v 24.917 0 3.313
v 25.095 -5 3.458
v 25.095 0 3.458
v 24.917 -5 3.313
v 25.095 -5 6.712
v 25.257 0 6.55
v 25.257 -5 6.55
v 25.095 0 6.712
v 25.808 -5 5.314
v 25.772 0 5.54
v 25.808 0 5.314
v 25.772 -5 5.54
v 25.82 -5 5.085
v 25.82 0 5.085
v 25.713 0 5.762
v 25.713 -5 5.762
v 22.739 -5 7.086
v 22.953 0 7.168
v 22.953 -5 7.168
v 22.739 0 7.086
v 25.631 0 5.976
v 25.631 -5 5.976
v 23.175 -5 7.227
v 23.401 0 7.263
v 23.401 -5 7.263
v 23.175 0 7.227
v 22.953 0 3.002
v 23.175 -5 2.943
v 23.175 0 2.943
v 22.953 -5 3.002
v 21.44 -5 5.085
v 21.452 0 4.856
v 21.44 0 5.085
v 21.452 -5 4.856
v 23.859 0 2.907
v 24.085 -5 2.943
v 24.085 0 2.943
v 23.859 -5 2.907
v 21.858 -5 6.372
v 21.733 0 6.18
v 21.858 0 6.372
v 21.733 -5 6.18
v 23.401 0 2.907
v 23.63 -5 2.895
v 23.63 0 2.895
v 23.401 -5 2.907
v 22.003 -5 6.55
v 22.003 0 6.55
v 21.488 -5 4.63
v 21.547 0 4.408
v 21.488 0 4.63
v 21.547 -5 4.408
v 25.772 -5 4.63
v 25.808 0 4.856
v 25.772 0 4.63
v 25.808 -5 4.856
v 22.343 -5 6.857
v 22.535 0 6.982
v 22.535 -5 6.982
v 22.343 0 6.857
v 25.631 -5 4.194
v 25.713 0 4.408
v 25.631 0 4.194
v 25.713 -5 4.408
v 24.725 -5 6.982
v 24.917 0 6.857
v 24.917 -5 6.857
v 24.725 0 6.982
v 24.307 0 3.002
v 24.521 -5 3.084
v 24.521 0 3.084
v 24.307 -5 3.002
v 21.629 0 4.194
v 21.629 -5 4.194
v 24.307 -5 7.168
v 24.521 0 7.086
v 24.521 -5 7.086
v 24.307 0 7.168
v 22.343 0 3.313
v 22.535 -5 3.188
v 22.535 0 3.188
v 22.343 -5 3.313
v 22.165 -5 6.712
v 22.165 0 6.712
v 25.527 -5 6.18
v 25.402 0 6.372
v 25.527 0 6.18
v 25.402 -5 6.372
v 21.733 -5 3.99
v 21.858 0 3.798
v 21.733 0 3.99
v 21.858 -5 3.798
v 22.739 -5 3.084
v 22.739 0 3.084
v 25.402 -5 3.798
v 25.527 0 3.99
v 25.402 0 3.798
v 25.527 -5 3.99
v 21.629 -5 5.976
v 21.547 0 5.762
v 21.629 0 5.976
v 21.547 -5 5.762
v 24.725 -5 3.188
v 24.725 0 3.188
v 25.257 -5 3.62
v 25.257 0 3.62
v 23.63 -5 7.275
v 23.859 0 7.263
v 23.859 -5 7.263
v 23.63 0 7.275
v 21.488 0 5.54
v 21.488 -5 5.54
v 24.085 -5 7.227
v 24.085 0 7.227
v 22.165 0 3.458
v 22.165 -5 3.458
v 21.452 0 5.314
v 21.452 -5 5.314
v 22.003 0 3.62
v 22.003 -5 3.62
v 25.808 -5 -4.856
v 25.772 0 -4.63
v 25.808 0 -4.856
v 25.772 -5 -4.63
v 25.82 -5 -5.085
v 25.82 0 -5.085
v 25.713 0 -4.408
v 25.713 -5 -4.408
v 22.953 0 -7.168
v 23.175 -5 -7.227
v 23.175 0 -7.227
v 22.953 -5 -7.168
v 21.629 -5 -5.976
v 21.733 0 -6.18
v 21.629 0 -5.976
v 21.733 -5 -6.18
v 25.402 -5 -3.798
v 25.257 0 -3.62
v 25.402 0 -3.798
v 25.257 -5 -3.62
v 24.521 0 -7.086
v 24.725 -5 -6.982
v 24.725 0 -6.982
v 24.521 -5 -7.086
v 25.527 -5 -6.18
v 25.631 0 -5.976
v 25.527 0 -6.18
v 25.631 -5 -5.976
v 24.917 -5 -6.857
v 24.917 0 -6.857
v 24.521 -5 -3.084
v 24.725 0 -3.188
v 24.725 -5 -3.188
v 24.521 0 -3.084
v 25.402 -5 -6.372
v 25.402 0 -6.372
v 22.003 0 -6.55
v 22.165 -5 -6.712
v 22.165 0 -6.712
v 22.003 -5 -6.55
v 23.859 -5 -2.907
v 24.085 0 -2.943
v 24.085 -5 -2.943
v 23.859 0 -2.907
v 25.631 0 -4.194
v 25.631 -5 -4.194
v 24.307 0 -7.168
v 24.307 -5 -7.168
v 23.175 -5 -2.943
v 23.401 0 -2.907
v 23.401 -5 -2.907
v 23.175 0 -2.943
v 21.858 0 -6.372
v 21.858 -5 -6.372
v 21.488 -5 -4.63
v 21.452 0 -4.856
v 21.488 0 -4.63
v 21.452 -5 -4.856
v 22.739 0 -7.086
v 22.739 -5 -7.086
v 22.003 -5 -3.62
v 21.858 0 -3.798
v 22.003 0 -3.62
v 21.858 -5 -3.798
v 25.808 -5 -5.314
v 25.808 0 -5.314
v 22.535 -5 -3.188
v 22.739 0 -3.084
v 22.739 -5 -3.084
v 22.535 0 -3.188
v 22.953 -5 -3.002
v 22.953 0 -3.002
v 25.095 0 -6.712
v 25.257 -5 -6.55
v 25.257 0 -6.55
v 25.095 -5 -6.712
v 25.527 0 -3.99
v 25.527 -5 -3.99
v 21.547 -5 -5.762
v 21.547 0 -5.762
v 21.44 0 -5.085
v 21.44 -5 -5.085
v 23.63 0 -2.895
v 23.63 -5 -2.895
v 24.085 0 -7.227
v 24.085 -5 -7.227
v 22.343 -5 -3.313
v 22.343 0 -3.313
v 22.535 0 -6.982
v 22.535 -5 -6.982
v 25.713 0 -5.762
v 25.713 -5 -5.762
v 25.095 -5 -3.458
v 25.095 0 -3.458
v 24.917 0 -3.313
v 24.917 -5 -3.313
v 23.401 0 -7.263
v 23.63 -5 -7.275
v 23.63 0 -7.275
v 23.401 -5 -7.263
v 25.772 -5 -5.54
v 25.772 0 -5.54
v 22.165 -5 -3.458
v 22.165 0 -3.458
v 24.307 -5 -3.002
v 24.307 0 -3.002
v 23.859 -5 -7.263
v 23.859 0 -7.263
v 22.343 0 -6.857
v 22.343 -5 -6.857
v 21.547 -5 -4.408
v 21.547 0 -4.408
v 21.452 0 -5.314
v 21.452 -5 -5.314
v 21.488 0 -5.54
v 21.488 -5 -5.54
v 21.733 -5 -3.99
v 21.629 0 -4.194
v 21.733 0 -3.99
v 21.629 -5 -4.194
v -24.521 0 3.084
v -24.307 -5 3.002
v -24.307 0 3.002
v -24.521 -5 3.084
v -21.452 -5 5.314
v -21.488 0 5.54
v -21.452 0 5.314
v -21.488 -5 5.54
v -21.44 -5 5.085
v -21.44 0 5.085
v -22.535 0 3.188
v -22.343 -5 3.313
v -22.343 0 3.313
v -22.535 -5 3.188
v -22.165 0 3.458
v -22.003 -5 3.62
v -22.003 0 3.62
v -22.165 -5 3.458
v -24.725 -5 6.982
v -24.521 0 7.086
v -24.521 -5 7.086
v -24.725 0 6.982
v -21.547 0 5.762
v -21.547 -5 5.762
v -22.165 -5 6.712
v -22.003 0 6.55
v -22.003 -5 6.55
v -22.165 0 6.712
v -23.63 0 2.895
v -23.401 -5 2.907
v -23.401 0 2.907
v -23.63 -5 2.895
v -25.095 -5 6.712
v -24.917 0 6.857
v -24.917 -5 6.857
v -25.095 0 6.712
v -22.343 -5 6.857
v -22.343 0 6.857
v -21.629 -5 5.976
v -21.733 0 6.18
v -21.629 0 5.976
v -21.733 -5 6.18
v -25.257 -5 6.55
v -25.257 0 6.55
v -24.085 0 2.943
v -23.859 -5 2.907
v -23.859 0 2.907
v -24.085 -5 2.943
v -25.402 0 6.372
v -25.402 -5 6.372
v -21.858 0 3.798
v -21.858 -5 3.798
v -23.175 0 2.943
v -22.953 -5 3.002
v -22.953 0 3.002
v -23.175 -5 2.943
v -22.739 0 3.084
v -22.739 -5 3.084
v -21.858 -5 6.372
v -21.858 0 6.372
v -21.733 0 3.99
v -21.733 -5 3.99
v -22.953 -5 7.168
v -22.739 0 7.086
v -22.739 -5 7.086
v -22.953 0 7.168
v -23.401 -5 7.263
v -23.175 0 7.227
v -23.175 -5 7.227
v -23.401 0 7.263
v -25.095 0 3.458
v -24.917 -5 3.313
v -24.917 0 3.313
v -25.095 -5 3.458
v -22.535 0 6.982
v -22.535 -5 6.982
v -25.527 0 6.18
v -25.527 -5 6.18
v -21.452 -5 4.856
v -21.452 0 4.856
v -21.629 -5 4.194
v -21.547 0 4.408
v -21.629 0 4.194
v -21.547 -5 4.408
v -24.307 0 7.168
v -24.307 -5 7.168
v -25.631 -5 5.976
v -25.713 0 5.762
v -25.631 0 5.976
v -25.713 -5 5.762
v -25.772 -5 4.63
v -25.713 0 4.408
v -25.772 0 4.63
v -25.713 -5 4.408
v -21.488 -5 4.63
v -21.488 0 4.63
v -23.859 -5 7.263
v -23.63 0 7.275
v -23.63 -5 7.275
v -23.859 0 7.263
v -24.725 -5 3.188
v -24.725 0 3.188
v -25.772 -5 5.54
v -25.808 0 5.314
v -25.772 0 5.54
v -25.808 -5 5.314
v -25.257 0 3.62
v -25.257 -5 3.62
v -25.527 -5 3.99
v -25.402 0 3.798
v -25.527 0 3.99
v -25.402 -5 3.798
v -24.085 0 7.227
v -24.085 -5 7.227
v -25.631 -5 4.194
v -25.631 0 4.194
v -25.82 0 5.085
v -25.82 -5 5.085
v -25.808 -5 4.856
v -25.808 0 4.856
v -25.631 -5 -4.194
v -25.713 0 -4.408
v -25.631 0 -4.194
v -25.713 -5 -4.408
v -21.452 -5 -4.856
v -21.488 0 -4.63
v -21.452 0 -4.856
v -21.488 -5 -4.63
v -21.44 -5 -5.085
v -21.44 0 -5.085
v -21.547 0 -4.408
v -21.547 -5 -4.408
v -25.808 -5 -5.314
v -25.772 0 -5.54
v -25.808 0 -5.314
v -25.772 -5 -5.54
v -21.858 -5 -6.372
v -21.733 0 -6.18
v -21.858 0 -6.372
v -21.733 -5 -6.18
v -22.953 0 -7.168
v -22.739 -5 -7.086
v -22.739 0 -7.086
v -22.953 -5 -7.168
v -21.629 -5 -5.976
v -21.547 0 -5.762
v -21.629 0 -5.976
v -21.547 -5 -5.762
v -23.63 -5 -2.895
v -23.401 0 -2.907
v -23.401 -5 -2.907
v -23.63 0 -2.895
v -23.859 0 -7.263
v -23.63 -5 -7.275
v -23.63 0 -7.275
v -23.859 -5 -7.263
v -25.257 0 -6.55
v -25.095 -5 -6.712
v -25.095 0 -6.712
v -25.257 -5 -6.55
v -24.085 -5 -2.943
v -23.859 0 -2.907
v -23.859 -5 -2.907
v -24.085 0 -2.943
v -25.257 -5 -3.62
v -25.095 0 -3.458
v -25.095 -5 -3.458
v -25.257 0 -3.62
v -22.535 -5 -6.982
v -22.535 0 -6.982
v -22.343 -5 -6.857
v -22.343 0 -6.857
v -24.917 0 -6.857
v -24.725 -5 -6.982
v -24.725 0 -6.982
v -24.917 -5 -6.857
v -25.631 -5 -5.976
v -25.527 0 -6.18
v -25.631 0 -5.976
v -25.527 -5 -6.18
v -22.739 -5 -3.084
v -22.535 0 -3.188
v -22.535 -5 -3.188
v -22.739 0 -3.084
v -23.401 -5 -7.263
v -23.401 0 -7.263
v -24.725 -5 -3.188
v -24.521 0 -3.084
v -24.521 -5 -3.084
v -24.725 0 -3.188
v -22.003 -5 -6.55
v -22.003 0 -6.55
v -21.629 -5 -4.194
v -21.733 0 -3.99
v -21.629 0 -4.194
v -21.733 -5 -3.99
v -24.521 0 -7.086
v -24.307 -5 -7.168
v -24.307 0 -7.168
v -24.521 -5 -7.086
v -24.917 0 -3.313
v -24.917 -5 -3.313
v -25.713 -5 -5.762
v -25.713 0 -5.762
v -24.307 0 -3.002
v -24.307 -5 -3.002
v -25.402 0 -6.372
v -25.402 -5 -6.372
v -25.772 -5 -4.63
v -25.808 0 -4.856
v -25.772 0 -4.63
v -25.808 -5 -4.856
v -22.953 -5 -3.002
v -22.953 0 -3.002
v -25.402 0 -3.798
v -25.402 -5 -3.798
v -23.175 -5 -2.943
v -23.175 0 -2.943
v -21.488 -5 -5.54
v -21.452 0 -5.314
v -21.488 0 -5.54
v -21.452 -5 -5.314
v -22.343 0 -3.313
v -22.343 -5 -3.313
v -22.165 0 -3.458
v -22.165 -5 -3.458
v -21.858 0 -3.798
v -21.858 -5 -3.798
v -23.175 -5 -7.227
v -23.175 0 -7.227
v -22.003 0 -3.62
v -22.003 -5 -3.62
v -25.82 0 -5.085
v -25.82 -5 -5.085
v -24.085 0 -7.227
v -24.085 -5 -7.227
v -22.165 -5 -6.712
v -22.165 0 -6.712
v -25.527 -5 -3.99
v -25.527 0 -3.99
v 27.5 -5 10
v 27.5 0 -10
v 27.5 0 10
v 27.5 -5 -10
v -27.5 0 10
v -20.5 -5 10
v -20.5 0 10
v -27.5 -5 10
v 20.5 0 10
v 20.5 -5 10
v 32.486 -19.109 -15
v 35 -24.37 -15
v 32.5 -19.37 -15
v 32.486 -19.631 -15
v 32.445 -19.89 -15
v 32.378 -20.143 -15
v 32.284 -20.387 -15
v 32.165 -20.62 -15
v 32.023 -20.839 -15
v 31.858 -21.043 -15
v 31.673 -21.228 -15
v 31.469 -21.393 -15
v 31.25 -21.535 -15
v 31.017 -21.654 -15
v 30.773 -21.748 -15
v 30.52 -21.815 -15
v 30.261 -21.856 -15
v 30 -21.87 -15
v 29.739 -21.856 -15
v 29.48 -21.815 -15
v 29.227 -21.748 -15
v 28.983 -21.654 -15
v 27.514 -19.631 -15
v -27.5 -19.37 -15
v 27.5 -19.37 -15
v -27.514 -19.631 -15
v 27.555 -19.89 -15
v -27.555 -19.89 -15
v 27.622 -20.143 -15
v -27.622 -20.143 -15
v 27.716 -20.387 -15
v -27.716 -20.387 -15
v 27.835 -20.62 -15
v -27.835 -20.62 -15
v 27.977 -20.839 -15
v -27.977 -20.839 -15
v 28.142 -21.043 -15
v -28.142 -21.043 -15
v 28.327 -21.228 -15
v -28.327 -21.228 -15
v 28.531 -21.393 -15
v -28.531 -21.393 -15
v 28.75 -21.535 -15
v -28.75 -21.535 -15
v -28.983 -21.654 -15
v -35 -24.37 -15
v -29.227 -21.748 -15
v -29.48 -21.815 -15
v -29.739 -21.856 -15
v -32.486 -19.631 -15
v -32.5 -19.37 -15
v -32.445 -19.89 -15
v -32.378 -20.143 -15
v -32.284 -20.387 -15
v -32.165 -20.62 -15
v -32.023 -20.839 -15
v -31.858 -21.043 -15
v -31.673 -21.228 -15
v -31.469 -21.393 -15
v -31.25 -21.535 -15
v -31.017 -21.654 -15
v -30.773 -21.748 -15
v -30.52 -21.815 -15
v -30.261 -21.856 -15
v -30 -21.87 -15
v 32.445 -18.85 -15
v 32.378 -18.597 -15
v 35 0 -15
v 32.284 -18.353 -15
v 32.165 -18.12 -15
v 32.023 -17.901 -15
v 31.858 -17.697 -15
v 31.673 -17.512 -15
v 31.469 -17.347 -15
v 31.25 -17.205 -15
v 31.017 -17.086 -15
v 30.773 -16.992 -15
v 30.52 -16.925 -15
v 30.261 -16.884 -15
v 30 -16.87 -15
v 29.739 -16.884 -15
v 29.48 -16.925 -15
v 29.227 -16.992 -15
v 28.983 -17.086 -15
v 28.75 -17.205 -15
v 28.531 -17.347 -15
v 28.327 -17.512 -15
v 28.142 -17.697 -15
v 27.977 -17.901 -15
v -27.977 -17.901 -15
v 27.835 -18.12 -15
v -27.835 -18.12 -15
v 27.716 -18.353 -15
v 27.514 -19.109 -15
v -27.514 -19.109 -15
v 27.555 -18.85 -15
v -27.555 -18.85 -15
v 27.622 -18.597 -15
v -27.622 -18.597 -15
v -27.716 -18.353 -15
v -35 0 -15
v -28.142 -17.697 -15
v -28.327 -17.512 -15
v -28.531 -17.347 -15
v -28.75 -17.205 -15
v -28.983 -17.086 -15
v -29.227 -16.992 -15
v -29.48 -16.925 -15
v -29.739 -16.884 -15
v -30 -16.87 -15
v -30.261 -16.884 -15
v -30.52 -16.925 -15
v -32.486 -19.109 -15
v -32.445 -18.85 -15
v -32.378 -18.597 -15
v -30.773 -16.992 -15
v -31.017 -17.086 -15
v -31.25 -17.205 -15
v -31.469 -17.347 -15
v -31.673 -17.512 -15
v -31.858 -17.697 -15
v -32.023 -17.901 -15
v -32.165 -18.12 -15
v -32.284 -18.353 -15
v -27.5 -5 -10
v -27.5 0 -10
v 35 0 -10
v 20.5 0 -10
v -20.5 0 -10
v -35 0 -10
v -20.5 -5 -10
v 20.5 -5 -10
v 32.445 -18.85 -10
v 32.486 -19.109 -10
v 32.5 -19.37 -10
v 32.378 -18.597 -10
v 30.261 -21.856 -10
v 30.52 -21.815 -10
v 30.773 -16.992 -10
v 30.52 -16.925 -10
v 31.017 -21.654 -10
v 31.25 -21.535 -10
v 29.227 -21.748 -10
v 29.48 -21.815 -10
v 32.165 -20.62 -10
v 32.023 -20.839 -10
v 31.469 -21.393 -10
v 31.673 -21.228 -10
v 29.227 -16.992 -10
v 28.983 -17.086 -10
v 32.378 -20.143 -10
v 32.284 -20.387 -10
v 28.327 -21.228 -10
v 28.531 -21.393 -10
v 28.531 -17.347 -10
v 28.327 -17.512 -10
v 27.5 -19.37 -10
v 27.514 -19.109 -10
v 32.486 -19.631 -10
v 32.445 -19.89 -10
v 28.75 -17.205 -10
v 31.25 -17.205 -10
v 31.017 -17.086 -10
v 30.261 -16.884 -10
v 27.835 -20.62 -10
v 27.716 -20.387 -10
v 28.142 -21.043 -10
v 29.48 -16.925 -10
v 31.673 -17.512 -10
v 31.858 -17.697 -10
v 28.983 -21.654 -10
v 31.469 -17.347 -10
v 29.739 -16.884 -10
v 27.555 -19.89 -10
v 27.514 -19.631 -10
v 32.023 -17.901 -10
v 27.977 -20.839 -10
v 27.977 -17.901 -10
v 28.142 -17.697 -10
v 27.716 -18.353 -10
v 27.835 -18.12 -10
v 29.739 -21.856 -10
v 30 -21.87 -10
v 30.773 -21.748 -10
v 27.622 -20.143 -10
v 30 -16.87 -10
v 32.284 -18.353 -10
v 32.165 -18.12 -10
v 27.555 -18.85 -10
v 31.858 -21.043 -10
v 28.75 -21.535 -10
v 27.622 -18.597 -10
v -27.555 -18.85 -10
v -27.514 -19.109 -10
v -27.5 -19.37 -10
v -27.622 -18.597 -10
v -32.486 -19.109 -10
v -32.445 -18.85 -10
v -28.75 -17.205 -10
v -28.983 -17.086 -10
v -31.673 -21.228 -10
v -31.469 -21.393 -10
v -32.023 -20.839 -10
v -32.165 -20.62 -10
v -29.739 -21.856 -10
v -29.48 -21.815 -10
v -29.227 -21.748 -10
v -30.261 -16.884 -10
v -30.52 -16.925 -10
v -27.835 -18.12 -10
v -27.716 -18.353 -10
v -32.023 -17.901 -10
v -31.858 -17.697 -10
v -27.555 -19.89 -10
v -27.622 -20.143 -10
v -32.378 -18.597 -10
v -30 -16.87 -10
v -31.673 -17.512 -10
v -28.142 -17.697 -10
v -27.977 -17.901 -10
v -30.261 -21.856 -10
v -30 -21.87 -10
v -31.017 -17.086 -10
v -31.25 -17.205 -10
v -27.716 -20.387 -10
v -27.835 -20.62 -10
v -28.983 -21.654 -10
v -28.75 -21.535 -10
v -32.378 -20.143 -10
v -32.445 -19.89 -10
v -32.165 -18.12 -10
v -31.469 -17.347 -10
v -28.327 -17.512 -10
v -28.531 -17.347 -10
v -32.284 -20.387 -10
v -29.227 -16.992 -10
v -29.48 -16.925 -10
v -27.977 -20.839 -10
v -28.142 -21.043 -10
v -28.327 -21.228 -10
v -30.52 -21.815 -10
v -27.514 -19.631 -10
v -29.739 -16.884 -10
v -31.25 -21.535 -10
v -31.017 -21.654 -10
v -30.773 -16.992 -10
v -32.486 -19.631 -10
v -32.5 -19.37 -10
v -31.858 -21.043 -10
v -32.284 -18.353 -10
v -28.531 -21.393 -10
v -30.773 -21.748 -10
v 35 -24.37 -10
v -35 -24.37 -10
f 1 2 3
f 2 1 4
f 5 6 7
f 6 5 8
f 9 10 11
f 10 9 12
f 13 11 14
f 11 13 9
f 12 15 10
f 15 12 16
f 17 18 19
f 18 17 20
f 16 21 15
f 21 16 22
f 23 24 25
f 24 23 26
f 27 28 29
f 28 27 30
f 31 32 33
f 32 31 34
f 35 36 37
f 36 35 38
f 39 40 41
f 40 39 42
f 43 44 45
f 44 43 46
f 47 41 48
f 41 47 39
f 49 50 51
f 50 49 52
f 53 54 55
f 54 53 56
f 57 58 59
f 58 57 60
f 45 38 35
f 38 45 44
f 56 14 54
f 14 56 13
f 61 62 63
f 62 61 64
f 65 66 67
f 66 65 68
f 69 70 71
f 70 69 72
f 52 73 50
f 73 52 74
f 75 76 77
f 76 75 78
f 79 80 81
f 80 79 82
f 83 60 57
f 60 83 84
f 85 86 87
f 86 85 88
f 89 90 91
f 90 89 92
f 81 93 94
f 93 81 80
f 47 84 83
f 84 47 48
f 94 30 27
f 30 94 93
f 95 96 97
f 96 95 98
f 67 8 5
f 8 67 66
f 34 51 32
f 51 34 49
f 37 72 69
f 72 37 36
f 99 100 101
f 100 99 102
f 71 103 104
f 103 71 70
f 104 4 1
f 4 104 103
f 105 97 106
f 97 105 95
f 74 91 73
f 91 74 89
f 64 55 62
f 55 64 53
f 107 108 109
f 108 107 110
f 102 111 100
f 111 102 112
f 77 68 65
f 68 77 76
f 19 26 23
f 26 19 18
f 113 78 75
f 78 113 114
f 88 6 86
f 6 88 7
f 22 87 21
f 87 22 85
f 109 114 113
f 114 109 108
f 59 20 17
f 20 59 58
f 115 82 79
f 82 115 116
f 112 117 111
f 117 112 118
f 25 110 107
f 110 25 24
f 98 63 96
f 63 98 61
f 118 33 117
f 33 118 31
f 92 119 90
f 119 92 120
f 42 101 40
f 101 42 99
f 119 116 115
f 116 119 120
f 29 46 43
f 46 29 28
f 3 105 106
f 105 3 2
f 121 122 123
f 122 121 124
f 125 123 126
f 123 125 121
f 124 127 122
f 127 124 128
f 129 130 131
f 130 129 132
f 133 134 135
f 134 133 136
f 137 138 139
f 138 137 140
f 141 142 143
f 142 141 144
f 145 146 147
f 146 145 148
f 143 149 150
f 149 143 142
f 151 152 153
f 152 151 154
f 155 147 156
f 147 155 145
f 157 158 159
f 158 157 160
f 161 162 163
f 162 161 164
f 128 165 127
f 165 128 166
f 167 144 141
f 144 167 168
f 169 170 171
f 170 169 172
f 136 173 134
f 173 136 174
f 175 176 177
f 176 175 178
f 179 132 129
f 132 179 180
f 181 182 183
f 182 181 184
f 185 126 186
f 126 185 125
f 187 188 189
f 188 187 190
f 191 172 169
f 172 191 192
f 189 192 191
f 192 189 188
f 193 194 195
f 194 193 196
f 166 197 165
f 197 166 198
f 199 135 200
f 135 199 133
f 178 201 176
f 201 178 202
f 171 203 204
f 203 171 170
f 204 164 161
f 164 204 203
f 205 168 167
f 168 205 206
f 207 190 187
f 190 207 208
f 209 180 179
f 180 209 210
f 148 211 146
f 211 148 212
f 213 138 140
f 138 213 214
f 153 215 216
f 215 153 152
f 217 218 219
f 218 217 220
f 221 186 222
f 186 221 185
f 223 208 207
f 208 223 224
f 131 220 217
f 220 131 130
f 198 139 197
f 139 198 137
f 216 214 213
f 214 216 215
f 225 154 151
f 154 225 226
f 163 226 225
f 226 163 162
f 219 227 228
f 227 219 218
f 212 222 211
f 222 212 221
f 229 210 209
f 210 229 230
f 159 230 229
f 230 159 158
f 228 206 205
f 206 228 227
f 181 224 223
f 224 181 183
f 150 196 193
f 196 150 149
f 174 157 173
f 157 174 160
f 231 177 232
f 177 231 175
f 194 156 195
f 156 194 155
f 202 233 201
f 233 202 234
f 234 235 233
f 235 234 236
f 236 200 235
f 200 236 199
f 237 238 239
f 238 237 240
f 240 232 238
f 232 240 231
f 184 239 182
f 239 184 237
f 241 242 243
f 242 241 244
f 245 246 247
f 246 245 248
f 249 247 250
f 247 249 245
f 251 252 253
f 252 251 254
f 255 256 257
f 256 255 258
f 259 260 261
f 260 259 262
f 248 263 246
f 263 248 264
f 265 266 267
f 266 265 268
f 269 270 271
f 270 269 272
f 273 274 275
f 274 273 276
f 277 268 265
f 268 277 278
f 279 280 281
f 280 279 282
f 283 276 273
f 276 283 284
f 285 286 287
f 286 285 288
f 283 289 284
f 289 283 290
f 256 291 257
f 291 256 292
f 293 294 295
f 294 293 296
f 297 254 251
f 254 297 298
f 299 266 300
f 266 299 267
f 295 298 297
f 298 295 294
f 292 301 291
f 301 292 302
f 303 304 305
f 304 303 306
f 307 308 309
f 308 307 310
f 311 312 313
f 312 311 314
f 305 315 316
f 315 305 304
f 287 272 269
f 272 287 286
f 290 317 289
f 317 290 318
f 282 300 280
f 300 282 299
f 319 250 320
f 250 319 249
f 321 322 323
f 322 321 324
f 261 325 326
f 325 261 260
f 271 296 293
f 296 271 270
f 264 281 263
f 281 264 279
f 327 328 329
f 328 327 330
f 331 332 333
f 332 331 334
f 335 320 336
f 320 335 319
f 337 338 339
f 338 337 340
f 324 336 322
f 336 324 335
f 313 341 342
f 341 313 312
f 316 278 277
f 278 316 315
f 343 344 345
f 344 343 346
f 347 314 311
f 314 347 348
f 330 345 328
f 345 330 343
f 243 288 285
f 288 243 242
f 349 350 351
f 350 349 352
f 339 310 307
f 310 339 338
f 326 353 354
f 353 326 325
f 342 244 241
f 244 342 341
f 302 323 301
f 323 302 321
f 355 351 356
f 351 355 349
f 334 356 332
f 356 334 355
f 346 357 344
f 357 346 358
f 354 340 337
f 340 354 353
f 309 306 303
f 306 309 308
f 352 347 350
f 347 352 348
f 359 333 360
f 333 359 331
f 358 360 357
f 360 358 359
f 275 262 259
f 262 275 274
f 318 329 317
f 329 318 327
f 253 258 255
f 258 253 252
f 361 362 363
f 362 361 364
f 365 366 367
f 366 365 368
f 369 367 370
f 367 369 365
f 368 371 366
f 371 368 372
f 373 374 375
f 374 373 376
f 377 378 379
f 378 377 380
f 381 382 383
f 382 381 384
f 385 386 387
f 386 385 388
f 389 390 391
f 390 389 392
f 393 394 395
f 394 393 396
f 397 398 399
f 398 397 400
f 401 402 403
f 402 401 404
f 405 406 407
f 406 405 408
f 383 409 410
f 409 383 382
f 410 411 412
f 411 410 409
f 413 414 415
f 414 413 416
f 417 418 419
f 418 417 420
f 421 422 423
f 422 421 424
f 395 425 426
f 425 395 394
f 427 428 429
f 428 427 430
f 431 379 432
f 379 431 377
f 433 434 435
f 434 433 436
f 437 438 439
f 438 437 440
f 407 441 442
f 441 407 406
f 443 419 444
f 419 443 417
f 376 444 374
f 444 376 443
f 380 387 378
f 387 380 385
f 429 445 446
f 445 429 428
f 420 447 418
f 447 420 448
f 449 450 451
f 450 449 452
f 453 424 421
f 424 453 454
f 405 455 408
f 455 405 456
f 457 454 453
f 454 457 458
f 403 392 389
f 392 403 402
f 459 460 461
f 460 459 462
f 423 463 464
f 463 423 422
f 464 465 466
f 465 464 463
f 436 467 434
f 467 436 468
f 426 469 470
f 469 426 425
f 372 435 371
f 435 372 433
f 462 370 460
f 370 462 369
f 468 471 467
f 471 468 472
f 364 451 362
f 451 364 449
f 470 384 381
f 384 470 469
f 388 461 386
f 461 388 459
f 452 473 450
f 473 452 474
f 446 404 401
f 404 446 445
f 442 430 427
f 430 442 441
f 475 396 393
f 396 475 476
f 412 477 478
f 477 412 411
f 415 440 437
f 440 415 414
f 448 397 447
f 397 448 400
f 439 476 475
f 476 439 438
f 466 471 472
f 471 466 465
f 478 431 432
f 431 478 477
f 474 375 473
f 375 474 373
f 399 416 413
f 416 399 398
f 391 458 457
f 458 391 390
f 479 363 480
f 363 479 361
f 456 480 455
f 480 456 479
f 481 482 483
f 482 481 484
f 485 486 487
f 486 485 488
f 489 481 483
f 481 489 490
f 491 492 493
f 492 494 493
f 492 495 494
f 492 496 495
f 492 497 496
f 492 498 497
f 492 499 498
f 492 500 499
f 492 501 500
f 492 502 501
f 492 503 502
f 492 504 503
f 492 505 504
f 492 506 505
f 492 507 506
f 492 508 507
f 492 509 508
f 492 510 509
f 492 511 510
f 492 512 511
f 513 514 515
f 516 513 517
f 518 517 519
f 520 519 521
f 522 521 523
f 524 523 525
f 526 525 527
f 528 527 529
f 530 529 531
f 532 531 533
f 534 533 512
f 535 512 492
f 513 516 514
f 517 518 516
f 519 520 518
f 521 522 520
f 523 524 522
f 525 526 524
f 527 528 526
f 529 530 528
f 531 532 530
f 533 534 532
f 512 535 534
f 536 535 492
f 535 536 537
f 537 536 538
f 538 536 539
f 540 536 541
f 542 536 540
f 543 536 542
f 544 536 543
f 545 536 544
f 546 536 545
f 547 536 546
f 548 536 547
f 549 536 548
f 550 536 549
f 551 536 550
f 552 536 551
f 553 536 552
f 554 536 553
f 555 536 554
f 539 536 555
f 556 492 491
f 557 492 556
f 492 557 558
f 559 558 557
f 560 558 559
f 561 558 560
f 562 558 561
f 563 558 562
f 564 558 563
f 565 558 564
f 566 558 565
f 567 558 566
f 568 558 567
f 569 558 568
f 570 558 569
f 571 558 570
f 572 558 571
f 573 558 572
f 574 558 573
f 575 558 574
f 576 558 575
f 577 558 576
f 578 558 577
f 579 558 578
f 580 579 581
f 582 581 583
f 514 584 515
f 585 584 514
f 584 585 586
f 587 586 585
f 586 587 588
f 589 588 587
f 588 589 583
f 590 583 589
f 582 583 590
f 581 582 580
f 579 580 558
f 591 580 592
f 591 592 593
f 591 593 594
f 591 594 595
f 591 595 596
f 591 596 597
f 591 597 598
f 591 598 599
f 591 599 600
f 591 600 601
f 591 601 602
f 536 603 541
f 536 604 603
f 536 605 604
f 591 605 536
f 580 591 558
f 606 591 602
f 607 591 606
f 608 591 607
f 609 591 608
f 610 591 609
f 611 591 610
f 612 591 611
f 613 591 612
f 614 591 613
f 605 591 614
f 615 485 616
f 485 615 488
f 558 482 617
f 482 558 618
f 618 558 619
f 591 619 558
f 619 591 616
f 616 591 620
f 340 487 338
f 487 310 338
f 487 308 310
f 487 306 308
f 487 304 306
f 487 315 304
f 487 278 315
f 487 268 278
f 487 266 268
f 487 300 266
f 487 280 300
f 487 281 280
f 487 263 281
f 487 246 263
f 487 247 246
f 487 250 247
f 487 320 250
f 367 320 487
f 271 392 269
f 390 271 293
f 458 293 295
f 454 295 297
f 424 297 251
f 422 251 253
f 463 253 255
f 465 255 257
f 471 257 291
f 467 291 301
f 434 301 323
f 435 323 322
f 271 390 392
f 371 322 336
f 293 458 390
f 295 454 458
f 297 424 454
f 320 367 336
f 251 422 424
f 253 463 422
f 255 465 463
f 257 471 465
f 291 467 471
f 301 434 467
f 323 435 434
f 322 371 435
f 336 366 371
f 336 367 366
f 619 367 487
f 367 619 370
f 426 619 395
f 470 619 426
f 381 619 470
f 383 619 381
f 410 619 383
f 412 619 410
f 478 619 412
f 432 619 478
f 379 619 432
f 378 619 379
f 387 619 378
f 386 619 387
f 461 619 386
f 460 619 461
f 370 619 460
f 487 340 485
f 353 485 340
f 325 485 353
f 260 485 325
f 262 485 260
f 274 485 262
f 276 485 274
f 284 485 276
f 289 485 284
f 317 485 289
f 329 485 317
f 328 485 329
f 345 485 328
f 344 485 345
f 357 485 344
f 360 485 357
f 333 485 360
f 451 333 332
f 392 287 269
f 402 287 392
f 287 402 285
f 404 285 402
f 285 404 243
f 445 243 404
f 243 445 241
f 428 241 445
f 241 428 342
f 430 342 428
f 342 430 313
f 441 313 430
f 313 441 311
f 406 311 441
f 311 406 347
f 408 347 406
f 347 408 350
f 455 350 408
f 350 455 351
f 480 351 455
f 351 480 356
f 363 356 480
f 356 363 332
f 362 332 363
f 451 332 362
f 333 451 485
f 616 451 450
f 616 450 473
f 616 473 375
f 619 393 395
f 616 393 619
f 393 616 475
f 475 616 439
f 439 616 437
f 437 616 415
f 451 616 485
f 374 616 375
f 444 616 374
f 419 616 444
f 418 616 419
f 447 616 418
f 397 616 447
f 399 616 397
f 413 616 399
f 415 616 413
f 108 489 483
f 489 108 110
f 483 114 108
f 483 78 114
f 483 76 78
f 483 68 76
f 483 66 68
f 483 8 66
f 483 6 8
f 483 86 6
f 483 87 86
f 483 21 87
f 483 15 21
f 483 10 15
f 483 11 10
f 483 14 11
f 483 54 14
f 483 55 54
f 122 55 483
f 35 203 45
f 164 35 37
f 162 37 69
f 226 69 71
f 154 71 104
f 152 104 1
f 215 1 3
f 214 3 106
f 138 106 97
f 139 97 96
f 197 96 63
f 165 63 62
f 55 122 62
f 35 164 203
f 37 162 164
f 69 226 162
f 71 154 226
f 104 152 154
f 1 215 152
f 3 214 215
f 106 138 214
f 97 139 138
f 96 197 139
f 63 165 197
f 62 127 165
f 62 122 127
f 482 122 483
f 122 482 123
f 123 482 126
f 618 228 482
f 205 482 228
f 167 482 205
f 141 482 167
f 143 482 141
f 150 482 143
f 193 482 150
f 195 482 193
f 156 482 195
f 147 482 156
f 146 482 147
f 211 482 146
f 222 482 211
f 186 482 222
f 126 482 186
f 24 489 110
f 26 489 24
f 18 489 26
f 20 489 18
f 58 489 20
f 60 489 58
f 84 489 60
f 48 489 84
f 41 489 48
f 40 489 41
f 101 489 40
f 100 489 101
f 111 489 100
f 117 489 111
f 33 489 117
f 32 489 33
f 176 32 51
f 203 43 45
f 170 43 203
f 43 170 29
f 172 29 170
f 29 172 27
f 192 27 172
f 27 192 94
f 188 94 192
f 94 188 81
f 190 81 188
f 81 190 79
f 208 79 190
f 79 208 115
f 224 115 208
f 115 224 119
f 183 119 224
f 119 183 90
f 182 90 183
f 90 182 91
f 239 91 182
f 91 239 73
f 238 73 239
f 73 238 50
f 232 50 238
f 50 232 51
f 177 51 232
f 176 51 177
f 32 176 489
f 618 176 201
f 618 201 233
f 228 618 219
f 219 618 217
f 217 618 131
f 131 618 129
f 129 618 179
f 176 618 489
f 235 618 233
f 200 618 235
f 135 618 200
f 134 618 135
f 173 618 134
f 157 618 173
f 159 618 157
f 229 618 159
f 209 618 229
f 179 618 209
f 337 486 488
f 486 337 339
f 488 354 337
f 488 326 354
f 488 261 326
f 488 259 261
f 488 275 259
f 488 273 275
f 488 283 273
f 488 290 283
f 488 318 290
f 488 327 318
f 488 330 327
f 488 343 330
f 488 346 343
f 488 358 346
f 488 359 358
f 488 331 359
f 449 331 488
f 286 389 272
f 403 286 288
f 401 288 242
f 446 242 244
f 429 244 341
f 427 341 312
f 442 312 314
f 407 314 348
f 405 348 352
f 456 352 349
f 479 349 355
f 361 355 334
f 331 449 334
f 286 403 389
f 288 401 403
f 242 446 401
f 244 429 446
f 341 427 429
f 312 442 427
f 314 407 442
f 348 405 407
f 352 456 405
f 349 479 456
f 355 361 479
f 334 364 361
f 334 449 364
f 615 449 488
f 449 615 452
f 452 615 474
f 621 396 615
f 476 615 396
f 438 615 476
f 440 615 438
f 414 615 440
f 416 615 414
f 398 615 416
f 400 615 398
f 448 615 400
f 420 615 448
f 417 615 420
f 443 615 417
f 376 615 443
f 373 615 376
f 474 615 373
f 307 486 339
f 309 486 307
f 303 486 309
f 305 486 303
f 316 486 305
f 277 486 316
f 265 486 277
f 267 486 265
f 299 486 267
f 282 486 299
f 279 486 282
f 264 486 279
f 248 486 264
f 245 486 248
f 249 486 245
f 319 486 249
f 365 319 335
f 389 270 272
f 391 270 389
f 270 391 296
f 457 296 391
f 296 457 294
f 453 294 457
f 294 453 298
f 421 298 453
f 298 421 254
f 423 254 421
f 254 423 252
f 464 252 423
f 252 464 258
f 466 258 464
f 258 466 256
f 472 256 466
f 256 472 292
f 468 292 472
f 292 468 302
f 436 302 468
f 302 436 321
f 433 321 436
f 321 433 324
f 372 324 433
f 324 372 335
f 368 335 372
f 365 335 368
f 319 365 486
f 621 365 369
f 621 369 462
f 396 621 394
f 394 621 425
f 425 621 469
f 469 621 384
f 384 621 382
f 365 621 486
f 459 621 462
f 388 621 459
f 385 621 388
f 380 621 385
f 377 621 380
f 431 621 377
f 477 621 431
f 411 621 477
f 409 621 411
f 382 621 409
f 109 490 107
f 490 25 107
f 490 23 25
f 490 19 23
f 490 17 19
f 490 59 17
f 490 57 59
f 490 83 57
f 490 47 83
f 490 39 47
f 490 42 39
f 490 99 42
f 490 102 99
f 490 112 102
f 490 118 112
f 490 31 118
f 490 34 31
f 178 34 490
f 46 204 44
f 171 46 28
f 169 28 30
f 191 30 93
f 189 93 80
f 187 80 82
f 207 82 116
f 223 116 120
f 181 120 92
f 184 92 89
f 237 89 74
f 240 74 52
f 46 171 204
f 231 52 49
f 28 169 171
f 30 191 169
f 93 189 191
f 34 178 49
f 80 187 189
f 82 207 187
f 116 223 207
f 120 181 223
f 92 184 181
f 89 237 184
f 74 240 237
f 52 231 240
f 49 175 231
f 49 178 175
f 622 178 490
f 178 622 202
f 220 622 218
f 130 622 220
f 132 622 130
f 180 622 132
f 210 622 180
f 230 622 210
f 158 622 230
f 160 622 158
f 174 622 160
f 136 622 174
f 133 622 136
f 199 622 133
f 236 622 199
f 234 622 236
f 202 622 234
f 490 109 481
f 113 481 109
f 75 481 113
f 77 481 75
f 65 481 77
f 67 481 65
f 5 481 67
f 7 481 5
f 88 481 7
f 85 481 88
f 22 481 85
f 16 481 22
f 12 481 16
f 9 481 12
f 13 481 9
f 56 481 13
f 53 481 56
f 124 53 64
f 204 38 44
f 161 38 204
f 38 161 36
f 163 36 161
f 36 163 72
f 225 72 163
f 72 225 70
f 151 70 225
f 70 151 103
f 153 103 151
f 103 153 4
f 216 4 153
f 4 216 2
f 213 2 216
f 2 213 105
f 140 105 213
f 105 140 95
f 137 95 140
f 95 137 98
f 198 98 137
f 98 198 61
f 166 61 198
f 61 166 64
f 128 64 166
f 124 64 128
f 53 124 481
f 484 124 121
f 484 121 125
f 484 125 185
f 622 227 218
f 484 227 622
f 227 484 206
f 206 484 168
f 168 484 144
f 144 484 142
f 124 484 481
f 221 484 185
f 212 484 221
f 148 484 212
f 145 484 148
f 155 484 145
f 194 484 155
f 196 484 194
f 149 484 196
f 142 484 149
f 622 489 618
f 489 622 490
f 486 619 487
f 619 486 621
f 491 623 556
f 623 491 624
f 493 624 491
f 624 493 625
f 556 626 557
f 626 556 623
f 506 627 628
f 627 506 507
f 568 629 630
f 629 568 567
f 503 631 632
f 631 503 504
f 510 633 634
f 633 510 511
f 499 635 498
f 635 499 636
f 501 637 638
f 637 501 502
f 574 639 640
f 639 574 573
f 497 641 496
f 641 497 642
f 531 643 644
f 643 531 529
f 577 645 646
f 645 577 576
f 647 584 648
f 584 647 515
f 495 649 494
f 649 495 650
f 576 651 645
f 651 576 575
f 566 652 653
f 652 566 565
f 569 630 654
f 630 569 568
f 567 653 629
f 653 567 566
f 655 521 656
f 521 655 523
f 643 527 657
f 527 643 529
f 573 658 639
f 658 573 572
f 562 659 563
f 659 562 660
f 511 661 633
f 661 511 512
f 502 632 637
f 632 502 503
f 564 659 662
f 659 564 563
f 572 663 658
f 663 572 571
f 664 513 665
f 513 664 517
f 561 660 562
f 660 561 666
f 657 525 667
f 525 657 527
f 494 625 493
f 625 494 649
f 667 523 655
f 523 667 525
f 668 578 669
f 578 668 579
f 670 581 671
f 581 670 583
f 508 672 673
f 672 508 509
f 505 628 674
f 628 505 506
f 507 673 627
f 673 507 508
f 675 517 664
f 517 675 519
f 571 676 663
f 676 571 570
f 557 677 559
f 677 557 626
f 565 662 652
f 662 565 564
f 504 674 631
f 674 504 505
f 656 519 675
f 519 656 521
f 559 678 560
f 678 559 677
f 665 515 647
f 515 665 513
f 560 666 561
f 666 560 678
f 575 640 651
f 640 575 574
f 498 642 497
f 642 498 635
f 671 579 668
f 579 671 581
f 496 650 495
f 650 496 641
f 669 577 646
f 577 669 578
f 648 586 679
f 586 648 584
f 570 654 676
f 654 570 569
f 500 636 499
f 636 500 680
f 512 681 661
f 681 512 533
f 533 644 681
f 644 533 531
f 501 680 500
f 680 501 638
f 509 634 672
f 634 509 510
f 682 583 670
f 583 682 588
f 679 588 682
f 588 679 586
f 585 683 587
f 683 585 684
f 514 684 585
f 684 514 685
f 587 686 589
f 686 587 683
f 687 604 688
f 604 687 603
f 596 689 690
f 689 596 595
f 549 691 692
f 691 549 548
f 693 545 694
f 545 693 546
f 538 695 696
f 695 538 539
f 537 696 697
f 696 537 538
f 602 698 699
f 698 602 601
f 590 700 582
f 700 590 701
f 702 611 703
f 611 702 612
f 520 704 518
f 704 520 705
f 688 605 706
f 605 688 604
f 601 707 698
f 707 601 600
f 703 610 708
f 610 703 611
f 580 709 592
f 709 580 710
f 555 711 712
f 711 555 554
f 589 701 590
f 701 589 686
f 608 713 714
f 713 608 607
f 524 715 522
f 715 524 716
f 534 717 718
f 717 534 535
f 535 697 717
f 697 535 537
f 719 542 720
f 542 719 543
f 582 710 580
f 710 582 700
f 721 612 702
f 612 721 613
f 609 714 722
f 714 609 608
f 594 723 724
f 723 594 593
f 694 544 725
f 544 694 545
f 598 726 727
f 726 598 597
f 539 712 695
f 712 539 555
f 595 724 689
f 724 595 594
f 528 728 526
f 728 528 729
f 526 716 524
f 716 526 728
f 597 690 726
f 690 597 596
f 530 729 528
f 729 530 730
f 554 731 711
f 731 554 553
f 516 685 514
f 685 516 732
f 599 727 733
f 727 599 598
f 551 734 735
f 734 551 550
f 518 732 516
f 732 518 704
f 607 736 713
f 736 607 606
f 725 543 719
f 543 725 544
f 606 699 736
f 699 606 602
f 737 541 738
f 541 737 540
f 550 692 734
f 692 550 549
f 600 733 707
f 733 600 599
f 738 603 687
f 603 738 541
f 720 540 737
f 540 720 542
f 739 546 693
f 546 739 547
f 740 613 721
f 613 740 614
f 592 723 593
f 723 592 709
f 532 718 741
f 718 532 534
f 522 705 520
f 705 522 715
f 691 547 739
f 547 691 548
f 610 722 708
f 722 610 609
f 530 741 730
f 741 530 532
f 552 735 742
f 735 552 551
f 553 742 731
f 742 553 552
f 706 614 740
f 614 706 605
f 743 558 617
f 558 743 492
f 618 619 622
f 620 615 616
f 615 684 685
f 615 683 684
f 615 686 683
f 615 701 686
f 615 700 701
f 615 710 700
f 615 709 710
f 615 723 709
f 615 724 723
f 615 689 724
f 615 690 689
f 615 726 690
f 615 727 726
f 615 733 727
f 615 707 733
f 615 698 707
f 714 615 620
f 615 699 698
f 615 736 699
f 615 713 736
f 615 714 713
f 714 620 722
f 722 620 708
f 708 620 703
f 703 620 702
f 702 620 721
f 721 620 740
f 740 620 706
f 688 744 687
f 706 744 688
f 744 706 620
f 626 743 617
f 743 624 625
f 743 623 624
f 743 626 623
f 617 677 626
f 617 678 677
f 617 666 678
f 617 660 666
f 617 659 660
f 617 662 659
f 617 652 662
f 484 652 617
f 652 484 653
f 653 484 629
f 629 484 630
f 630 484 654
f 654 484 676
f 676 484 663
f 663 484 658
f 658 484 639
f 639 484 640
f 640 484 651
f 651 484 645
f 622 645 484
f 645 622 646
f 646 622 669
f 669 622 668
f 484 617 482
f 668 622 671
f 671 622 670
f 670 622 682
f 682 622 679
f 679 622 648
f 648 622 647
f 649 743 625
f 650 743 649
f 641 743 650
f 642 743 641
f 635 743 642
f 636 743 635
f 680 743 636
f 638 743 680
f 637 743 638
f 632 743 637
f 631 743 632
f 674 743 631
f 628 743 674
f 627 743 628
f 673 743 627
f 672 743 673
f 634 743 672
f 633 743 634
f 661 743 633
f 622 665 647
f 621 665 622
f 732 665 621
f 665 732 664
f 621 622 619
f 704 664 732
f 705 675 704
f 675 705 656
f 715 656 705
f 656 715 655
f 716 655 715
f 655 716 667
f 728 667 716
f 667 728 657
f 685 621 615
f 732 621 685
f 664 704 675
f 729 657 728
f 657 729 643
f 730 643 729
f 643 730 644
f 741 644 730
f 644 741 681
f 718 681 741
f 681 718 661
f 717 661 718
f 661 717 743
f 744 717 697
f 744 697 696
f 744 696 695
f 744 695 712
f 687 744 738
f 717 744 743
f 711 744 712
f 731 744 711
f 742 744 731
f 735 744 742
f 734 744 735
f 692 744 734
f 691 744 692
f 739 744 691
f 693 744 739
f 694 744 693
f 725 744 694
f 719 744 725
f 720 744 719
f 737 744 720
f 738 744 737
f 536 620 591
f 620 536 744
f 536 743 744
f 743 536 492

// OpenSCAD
sv_hole_dz = 10.17;
sv_hole_dx= 47.26;
sv_body_x = 41;
sv_body_z = 20;
sv_mount_hole_d = 4.38;

plate_th = 5;

sv_mnt_face_to_hole = 19.37;
sv_mnt_face_to_edge = sv_mnt_face_to_hole + 5;
plate_hole_x = 60;

$fn = 60;

module sv_mount_bracket() {
    difference() {
	translate([0,-plate_th/2,-plate_th/2]) cube([55,plate_th,sv_body_z+plate_th], center=true);
	translate([0,-plate_th/2,0]) cube([sv_body_x,plate_th+0.1,sv_body_z+0.1],center=true);
	for (x = [sv_hole_dx/2,-sv_hole_dx/2]) {
	    for (z = [sv_hole_dz/2,-sv_hole_dz/2]) {
		translate([x,0,z])
		rotate([90,0,0]) cylinder(d=sv_mount_hole_d,h=20,center=true);
	    }
	}
    }
    difference() {
	translate([0,-sv_mnt_face_to_edge/2,-(sv_body_z+plate_th)/2])
	cube([plate_hole_x+10,sv_mnt_face_to_edge,plate_th],center=true);
	for (x = [plate_hole_x/2,-plate_hole_x/2]) {
	    translate([x,-sv_mnt_face_to_hole,0]) {
		cylinder(d=5,h=40,center=true);
	    }
	}
    }
}

sv_mount_bracket();
